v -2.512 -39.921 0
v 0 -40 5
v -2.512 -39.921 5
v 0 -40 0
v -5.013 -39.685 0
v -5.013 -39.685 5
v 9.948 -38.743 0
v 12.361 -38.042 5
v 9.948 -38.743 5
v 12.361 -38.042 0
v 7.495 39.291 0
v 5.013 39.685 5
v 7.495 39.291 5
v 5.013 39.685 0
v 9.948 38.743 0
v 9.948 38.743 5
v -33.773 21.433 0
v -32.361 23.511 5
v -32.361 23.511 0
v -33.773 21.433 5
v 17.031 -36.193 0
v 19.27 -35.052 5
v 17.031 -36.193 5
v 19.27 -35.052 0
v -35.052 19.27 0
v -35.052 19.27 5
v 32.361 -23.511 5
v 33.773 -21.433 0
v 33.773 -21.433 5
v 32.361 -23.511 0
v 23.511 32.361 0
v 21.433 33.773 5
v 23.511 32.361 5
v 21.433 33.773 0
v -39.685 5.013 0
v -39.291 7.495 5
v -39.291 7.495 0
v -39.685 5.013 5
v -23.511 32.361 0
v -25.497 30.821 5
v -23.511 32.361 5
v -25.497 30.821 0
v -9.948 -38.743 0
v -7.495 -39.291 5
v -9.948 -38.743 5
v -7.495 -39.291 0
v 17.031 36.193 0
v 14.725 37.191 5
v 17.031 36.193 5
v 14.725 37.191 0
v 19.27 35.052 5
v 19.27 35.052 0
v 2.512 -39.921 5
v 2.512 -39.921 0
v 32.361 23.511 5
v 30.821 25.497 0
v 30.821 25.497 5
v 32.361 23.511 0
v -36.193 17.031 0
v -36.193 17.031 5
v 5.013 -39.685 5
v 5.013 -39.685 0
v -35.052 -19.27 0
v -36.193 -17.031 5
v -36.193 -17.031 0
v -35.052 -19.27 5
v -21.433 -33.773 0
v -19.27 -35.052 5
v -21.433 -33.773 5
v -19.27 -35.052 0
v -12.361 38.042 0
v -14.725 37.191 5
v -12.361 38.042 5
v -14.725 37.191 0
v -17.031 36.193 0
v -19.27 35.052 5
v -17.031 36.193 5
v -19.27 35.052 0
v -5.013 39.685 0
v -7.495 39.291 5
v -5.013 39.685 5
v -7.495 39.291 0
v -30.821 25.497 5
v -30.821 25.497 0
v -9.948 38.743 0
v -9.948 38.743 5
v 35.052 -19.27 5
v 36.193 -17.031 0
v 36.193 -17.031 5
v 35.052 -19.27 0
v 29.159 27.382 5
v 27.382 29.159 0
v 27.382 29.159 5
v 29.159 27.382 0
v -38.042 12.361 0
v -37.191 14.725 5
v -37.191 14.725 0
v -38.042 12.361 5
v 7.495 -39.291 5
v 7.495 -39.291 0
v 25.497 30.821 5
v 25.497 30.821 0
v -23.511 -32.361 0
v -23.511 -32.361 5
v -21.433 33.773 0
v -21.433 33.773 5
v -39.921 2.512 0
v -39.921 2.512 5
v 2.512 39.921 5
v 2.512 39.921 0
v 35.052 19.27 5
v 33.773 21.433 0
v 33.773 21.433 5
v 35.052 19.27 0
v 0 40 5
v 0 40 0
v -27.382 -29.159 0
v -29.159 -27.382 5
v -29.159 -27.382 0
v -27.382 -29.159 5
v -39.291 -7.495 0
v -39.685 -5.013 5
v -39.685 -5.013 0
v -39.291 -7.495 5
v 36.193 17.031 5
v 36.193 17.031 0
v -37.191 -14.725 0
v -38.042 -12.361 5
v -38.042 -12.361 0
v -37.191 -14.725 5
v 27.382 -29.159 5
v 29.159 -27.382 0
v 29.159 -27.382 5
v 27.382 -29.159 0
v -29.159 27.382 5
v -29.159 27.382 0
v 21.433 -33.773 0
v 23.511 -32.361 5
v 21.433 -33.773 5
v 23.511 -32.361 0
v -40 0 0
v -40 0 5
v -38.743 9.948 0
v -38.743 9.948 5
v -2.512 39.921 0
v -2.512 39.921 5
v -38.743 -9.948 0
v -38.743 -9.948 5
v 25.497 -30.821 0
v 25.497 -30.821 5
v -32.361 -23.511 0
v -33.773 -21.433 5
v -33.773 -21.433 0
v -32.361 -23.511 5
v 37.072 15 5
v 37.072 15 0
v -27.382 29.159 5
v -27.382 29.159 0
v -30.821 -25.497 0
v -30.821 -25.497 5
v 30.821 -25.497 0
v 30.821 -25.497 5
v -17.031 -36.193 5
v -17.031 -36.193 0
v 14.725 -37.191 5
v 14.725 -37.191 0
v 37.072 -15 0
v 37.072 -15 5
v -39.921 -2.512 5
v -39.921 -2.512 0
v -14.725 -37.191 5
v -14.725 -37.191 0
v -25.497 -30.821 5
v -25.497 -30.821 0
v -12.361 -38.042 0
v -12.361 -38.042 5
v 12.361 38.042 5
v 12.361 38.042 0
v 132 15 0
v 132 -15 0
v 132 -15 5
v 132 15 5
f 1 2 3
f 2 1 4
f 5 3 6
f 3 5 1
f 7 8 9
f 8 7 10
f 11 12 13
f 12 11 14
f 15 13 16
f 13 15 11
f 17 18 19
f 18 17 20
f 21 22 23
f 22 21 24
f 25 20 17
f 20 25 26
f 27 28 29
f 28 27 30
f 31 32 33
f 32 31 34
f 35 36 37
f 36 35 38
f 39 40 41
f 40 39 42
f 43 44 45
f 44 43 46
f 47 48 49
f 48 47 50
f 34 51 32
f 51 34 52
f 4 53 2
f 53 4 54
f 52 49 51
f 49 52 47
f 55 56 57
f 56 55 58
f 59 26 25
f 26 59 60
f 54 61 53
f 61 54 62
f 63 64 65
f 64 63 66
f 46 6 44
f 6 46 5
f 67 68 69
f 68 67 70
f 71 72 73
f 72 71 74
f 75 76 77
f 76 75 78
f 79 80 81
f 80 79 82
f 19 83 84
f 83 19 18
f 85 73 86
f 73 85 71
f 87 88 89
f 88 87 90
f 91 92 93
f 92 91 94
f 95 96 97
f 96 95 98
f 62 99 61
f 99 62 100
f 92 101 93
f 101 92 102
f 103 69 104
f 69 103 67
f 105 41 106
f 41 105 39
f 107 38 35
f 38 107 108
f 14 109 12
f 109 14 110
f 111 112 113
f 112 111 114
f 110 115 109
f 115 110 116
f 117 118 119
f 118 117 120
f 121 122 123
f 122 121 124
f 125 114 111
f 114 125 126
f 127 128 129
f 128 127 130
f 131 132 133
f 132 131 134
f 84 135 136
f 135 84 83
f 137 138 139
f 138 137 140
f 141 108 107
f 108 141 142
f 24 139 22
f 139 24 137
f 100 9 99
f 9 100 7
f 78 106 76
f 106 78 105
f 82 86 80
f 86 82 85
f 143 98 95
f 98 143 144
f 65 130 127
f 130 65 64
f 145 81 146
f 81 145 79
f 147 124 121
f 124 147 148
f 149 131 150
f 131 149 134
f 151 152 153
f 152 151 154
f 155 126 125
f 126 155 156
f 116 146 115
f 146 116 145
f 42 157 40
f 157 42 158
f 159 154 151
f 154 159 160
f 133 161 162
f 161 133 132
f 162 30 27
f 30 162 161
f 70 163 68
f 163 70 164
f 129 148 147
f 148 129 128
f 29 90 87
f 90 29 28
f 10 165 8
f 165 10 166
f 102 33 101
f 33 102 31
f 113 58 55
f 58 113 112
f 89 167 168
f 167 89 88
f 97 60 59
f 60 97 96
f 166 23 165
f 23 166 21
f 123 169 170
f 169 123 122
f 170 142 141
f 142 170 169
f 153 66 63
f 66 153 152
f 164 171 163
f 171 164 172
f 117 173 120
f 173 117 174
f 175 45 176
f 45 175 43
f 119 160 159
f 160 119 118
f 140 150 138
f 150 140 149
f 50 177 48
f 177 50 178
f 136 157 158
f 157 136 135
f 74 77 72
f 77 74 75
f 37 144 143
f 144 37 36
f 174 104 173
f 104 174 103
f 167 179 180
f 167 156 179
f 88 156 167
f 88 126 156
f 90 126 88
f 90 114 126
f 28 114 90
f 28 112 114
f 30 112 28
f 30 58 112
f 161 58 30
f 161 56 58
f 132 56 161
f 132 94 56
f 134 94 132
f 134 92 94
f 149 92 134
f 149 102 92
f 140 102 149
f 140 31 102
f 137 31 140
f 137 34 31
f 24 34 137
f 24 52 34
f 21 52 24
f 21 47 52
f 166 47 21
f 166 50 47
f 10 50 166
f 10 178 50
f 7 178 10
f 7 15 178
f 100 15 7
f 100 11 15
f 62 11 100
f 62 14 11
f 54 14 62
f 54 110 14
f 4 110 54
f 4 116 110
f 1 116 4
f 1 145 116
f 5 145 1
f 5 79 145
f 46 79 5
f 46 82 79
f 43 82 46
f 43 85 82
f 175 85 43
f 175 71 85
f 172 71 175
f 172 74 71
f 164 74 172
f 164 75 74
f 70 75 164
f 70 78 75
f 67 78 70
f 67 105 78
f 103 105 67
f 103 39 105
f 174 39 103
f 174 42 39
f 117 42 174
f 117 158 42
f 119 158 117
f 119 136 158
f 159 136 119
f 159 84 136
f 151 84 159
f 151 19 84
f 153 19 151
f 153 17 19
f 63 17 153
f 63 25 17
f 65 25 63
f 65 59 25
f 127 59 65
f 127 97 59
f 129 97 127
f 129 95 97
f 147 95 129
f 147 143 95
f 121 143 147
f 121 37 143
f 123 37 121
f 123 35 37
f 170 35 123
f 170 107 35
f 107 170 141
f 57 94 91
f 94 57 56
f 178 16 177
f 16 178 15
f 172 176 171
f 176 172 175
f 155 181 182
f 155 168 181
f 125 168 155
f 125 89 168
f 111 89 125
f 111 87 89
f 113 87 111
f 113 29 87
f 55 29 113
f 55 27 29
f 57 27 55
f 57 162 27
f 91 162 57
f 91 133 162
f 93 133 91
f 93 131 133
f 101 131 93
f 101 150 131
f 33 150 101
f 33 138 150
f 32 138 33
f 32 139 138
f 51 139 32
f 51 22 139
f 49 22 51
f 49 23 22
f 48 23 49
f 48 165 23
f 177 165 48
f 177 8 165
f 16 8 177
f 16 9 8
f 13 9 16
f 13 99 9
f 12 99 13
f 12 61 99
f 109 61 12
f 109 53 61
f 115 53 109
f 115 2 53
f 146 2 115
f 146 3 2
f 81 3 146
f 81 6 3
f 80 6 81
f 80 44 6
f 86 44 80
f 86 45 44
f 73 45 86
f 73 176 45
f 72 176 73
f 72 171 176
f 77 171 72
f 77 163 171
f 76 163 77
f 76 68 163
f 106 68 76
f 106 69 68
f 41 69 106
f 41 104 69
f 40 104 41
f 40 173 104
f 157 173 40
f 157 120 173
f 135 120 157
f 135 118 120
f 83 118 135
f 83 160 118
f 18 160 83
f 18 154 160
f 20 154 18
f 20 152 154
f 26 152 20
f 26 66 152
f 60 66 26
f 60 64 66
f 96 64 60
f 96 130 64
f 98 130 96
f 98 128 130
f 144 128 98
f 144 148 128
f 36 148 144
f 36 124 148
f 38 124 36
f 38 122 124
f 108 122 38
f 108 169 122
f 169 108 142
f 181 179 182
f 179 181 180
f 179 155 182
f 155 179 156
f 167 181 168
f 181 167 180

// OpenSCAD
$fn=100;
target_size=80;
target_thickness=5;
bottom_length=100;
difference()
{
union()
{
cylinder(h=target_thickness,r=target_size/2);
translate([target_size/2.5,-15,0])cube([bottom_length,30,target_thickness]);
}
}
